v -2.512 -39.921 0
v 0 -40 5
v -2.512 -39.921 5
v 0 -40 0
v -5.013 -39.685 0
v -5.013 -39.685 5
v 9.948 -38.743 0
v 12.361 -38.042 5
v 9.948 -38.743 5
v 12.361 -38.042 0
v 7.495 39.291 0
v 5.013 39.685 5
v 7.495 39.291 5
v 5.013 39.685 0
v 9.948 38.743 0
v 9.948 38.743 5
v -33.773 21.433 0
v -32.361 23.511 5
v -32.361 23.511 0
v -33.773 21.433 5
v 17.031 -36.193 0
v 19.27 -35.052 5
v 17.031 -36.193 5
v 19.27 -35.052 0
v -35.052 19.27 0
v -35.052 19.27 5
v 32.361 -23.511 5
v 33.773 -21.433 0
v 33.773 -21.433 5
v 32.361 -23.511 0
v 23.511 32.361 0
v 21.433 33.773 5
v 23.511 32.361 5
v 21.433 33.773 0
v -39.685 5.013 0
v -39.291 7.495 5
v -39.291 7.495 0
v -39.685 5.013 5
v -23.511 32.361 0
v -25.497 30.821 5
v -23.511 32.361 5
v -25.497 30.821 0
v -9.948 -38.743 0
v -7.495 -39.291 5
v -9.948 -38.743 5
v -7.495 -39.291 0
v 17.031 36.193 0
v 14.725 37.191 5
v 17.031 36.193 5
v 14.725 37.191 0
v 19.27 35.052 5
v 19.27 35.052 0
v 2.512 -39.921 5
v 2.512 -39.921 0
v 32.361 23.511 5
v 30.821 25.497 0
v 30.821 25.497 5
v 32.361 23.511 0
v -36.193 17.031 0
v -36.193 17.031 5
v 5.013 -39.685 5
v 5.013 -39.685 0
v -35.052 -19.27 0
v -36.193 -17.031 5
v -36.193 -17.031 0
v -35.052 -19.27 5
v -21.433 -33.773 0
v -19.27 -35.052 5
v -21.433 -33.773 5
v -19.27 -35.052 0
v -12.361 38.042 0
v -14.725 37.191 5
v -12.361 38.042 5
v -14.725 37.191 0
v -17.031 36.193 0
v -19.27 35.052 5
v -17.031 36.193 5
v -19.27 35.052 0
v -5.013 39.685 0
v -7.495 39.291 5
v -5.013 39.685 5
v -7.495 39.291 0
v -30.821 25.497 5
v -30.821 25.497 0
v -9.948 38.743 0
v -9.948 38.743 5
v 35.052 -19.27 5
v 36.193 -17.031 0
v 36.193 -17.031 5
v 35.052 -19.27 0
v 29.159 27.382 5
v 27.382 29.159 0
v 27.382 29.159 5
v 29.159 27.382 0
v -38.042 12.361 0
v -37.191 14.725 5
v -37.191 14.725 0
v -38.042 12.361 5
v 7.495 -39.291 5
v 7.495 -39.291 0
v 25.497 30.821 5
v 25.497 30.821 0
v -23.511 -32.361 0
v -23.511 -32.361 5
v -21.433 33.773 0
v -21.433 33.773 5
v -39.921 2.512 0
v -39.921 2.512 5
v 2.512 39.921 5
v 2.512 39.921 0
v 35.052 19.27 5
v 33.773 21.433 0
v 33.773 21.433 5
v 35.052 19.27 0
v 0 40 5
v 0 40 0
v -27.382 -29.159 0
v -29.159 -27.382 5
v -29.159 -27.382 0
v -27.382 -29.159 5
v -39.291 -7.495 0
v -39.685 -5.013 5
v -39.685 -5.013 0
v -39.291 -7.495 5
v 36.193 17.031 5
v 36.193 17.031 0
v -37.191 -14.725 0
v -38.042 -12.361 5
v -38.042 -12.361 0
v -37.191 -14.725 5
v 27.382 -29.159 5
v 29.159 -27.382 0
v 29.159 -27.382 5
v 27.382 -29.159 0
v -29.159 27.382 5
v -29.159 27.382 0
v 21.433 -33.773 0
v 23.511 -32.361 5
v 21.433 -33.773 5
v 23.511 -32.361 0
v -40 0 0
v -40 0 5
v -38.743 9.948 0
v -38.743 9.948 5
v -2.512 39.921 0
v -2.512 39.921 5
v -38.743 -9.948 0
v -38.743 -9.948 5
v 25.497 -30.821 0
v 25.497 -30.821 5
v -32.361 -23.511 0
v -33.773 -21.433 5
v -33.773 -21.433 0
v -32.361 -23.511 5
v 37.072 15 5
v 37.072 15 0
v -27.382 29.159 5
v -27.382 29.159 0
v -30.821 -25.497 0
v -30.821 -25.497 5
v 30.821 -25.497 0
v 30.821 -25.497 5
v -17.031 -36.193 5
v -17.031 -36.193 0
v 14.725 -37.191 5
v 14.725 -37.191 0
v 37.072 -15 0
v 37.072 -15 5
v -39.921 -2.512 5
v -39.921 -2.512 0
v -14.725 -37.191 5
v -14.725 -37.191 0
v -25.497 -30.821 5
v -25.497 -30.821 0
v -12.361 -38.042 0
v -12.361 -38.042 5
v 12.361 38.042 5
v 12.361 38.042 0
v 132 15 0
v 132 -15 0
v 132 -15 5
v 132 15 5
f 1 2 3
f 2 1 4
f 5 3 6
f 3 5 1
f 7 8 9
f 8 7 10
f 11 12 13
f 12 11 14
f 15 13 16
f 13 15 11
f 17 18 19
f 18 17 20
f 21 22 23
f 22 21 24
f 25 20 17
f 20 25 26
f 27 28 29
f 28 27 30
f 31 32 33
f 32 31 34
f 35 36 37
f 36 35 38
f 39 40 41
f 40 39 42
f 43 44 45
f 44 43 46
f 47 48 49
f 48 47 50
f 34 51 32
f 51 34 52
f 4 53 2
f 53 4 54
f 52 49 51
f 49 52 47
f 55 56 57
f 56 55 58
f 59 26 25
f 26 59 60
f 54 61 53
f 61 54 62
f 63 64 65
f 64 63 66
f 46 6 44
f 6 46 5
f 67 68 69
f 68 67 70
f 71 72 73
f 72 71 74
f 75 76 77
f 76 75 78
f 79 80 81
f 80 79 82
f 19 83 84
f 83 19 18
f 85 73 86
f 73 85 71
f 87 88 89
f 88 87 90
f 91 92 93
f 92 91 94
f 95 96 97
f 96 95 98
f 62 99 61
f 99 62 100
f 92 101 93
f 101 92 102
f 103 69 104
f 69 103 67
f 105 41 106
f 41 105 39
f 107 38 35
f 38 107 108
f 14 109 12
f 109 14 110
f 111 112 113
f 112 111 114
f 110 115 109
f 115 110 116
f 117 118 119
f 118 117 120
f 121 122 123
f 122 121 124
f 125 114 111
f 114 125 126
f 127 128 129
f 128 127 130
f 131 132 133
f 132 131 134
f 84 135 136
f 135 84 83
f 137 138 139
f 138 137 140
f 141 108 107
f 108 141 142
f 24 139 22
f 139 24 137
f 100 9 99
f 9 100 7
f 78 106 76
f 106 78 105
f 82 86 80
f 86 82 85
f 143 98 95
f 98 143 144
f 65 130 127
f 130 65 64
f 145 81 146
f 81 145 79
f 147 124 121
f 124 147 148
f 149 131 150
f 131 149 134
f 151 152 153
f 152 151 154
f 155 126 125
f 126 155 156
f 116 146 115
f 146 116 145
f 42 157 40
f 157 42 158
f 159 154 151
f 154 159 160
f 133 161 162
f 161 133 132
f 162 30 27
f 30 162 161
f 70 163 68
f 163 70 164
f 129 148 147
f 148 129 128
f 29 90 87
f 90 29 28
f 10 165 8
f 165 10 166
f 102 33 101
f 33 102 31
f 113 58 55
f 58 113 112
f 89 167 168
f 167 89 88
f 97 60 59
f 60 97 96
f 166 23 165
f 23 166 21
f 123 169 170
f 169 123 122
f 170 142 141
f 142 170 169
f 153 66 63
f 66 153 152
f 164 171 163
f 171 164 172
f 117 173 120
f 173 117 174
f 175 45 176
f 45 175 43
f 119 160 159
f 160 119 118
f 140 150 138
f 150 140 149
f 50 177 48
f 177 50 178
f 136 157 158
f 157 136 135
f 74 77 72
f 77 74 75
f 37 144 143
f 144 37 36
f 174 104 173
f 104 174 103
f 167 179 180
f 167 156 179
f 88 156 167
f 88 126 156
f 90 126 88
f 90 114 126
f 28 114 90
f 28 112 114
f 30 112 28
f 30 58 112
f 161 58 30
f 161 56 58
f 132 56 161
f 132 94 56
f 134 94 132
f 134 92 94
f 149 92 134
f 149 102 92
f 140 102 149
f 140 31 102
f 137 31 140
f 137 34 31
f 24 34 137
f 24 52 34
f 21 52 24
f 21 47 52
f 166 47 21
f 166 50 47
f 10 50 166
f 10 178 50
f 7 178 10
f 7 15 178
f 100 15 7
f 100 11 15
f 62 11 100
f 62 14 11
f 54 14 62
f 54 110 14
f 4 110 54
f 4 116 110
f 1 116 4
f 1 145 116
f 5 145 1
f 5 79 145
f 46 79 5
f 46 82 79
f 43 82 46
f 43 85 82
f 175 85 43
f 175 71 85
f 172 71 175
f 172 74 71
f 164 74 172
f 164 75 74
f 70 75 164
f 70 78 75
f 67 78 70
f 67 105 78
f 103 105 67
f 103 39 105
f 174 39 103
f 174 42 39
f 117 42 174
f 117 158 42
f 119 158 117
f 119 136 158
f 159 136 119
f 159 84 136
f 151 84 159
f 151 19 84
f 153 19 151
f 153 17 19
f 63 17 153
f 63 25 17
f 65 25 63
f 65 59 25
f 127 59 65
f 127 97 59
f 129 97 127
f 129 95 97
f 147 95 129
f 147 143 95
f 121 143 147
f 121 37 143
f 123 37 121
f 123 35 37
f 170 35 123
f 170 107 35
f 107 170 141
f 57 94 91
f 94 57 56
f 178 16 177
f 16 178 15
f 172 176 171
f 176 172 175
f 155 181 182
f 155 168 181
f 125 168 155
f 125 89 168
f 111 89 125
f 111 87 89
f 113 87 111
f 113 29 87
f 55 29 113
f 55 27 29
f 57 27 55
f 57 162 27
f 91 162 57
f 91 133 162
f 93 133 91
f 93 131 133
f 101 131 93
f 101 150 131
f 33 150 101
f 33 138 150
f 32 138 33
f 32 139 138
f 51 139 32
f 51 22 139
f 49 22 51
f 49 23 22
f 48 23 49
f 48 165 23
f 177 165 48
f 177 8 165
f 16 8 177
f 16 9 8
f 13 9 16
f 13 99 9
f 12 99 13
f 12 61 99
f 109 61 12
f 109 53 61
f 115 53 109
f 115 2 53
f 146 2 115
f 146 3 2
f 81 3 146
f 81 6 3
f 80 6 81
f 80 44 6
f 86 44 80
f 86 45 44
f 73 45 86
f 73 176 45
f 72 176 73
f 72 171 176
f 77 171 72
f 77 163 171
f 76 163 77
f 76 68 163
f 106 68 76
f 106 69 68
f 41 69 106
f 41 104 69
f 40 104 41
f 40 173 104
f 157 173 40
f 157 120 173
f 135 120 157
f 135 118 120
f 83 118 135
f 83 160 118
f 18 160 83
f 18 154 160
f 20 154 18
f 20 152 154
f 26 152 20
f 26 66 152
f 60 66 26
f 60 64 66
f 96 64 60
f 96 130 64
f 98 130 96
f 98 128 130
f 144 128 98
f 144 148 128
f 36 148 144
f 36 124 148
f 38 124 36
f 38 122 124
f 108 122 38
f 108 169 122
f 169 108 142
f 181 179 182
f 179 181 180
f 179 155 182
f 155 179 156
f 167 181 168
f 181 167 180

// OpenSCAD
$fn=100;
target_size=80;
target_thickness=5;
bottom_length=100;
difference()
{
union()
{
cylinder(h=target_thickness,r=target_size/2);
translate([target_size/2.5,-15,0])cube([bottom_length,30,target_thickness]);
}
}
